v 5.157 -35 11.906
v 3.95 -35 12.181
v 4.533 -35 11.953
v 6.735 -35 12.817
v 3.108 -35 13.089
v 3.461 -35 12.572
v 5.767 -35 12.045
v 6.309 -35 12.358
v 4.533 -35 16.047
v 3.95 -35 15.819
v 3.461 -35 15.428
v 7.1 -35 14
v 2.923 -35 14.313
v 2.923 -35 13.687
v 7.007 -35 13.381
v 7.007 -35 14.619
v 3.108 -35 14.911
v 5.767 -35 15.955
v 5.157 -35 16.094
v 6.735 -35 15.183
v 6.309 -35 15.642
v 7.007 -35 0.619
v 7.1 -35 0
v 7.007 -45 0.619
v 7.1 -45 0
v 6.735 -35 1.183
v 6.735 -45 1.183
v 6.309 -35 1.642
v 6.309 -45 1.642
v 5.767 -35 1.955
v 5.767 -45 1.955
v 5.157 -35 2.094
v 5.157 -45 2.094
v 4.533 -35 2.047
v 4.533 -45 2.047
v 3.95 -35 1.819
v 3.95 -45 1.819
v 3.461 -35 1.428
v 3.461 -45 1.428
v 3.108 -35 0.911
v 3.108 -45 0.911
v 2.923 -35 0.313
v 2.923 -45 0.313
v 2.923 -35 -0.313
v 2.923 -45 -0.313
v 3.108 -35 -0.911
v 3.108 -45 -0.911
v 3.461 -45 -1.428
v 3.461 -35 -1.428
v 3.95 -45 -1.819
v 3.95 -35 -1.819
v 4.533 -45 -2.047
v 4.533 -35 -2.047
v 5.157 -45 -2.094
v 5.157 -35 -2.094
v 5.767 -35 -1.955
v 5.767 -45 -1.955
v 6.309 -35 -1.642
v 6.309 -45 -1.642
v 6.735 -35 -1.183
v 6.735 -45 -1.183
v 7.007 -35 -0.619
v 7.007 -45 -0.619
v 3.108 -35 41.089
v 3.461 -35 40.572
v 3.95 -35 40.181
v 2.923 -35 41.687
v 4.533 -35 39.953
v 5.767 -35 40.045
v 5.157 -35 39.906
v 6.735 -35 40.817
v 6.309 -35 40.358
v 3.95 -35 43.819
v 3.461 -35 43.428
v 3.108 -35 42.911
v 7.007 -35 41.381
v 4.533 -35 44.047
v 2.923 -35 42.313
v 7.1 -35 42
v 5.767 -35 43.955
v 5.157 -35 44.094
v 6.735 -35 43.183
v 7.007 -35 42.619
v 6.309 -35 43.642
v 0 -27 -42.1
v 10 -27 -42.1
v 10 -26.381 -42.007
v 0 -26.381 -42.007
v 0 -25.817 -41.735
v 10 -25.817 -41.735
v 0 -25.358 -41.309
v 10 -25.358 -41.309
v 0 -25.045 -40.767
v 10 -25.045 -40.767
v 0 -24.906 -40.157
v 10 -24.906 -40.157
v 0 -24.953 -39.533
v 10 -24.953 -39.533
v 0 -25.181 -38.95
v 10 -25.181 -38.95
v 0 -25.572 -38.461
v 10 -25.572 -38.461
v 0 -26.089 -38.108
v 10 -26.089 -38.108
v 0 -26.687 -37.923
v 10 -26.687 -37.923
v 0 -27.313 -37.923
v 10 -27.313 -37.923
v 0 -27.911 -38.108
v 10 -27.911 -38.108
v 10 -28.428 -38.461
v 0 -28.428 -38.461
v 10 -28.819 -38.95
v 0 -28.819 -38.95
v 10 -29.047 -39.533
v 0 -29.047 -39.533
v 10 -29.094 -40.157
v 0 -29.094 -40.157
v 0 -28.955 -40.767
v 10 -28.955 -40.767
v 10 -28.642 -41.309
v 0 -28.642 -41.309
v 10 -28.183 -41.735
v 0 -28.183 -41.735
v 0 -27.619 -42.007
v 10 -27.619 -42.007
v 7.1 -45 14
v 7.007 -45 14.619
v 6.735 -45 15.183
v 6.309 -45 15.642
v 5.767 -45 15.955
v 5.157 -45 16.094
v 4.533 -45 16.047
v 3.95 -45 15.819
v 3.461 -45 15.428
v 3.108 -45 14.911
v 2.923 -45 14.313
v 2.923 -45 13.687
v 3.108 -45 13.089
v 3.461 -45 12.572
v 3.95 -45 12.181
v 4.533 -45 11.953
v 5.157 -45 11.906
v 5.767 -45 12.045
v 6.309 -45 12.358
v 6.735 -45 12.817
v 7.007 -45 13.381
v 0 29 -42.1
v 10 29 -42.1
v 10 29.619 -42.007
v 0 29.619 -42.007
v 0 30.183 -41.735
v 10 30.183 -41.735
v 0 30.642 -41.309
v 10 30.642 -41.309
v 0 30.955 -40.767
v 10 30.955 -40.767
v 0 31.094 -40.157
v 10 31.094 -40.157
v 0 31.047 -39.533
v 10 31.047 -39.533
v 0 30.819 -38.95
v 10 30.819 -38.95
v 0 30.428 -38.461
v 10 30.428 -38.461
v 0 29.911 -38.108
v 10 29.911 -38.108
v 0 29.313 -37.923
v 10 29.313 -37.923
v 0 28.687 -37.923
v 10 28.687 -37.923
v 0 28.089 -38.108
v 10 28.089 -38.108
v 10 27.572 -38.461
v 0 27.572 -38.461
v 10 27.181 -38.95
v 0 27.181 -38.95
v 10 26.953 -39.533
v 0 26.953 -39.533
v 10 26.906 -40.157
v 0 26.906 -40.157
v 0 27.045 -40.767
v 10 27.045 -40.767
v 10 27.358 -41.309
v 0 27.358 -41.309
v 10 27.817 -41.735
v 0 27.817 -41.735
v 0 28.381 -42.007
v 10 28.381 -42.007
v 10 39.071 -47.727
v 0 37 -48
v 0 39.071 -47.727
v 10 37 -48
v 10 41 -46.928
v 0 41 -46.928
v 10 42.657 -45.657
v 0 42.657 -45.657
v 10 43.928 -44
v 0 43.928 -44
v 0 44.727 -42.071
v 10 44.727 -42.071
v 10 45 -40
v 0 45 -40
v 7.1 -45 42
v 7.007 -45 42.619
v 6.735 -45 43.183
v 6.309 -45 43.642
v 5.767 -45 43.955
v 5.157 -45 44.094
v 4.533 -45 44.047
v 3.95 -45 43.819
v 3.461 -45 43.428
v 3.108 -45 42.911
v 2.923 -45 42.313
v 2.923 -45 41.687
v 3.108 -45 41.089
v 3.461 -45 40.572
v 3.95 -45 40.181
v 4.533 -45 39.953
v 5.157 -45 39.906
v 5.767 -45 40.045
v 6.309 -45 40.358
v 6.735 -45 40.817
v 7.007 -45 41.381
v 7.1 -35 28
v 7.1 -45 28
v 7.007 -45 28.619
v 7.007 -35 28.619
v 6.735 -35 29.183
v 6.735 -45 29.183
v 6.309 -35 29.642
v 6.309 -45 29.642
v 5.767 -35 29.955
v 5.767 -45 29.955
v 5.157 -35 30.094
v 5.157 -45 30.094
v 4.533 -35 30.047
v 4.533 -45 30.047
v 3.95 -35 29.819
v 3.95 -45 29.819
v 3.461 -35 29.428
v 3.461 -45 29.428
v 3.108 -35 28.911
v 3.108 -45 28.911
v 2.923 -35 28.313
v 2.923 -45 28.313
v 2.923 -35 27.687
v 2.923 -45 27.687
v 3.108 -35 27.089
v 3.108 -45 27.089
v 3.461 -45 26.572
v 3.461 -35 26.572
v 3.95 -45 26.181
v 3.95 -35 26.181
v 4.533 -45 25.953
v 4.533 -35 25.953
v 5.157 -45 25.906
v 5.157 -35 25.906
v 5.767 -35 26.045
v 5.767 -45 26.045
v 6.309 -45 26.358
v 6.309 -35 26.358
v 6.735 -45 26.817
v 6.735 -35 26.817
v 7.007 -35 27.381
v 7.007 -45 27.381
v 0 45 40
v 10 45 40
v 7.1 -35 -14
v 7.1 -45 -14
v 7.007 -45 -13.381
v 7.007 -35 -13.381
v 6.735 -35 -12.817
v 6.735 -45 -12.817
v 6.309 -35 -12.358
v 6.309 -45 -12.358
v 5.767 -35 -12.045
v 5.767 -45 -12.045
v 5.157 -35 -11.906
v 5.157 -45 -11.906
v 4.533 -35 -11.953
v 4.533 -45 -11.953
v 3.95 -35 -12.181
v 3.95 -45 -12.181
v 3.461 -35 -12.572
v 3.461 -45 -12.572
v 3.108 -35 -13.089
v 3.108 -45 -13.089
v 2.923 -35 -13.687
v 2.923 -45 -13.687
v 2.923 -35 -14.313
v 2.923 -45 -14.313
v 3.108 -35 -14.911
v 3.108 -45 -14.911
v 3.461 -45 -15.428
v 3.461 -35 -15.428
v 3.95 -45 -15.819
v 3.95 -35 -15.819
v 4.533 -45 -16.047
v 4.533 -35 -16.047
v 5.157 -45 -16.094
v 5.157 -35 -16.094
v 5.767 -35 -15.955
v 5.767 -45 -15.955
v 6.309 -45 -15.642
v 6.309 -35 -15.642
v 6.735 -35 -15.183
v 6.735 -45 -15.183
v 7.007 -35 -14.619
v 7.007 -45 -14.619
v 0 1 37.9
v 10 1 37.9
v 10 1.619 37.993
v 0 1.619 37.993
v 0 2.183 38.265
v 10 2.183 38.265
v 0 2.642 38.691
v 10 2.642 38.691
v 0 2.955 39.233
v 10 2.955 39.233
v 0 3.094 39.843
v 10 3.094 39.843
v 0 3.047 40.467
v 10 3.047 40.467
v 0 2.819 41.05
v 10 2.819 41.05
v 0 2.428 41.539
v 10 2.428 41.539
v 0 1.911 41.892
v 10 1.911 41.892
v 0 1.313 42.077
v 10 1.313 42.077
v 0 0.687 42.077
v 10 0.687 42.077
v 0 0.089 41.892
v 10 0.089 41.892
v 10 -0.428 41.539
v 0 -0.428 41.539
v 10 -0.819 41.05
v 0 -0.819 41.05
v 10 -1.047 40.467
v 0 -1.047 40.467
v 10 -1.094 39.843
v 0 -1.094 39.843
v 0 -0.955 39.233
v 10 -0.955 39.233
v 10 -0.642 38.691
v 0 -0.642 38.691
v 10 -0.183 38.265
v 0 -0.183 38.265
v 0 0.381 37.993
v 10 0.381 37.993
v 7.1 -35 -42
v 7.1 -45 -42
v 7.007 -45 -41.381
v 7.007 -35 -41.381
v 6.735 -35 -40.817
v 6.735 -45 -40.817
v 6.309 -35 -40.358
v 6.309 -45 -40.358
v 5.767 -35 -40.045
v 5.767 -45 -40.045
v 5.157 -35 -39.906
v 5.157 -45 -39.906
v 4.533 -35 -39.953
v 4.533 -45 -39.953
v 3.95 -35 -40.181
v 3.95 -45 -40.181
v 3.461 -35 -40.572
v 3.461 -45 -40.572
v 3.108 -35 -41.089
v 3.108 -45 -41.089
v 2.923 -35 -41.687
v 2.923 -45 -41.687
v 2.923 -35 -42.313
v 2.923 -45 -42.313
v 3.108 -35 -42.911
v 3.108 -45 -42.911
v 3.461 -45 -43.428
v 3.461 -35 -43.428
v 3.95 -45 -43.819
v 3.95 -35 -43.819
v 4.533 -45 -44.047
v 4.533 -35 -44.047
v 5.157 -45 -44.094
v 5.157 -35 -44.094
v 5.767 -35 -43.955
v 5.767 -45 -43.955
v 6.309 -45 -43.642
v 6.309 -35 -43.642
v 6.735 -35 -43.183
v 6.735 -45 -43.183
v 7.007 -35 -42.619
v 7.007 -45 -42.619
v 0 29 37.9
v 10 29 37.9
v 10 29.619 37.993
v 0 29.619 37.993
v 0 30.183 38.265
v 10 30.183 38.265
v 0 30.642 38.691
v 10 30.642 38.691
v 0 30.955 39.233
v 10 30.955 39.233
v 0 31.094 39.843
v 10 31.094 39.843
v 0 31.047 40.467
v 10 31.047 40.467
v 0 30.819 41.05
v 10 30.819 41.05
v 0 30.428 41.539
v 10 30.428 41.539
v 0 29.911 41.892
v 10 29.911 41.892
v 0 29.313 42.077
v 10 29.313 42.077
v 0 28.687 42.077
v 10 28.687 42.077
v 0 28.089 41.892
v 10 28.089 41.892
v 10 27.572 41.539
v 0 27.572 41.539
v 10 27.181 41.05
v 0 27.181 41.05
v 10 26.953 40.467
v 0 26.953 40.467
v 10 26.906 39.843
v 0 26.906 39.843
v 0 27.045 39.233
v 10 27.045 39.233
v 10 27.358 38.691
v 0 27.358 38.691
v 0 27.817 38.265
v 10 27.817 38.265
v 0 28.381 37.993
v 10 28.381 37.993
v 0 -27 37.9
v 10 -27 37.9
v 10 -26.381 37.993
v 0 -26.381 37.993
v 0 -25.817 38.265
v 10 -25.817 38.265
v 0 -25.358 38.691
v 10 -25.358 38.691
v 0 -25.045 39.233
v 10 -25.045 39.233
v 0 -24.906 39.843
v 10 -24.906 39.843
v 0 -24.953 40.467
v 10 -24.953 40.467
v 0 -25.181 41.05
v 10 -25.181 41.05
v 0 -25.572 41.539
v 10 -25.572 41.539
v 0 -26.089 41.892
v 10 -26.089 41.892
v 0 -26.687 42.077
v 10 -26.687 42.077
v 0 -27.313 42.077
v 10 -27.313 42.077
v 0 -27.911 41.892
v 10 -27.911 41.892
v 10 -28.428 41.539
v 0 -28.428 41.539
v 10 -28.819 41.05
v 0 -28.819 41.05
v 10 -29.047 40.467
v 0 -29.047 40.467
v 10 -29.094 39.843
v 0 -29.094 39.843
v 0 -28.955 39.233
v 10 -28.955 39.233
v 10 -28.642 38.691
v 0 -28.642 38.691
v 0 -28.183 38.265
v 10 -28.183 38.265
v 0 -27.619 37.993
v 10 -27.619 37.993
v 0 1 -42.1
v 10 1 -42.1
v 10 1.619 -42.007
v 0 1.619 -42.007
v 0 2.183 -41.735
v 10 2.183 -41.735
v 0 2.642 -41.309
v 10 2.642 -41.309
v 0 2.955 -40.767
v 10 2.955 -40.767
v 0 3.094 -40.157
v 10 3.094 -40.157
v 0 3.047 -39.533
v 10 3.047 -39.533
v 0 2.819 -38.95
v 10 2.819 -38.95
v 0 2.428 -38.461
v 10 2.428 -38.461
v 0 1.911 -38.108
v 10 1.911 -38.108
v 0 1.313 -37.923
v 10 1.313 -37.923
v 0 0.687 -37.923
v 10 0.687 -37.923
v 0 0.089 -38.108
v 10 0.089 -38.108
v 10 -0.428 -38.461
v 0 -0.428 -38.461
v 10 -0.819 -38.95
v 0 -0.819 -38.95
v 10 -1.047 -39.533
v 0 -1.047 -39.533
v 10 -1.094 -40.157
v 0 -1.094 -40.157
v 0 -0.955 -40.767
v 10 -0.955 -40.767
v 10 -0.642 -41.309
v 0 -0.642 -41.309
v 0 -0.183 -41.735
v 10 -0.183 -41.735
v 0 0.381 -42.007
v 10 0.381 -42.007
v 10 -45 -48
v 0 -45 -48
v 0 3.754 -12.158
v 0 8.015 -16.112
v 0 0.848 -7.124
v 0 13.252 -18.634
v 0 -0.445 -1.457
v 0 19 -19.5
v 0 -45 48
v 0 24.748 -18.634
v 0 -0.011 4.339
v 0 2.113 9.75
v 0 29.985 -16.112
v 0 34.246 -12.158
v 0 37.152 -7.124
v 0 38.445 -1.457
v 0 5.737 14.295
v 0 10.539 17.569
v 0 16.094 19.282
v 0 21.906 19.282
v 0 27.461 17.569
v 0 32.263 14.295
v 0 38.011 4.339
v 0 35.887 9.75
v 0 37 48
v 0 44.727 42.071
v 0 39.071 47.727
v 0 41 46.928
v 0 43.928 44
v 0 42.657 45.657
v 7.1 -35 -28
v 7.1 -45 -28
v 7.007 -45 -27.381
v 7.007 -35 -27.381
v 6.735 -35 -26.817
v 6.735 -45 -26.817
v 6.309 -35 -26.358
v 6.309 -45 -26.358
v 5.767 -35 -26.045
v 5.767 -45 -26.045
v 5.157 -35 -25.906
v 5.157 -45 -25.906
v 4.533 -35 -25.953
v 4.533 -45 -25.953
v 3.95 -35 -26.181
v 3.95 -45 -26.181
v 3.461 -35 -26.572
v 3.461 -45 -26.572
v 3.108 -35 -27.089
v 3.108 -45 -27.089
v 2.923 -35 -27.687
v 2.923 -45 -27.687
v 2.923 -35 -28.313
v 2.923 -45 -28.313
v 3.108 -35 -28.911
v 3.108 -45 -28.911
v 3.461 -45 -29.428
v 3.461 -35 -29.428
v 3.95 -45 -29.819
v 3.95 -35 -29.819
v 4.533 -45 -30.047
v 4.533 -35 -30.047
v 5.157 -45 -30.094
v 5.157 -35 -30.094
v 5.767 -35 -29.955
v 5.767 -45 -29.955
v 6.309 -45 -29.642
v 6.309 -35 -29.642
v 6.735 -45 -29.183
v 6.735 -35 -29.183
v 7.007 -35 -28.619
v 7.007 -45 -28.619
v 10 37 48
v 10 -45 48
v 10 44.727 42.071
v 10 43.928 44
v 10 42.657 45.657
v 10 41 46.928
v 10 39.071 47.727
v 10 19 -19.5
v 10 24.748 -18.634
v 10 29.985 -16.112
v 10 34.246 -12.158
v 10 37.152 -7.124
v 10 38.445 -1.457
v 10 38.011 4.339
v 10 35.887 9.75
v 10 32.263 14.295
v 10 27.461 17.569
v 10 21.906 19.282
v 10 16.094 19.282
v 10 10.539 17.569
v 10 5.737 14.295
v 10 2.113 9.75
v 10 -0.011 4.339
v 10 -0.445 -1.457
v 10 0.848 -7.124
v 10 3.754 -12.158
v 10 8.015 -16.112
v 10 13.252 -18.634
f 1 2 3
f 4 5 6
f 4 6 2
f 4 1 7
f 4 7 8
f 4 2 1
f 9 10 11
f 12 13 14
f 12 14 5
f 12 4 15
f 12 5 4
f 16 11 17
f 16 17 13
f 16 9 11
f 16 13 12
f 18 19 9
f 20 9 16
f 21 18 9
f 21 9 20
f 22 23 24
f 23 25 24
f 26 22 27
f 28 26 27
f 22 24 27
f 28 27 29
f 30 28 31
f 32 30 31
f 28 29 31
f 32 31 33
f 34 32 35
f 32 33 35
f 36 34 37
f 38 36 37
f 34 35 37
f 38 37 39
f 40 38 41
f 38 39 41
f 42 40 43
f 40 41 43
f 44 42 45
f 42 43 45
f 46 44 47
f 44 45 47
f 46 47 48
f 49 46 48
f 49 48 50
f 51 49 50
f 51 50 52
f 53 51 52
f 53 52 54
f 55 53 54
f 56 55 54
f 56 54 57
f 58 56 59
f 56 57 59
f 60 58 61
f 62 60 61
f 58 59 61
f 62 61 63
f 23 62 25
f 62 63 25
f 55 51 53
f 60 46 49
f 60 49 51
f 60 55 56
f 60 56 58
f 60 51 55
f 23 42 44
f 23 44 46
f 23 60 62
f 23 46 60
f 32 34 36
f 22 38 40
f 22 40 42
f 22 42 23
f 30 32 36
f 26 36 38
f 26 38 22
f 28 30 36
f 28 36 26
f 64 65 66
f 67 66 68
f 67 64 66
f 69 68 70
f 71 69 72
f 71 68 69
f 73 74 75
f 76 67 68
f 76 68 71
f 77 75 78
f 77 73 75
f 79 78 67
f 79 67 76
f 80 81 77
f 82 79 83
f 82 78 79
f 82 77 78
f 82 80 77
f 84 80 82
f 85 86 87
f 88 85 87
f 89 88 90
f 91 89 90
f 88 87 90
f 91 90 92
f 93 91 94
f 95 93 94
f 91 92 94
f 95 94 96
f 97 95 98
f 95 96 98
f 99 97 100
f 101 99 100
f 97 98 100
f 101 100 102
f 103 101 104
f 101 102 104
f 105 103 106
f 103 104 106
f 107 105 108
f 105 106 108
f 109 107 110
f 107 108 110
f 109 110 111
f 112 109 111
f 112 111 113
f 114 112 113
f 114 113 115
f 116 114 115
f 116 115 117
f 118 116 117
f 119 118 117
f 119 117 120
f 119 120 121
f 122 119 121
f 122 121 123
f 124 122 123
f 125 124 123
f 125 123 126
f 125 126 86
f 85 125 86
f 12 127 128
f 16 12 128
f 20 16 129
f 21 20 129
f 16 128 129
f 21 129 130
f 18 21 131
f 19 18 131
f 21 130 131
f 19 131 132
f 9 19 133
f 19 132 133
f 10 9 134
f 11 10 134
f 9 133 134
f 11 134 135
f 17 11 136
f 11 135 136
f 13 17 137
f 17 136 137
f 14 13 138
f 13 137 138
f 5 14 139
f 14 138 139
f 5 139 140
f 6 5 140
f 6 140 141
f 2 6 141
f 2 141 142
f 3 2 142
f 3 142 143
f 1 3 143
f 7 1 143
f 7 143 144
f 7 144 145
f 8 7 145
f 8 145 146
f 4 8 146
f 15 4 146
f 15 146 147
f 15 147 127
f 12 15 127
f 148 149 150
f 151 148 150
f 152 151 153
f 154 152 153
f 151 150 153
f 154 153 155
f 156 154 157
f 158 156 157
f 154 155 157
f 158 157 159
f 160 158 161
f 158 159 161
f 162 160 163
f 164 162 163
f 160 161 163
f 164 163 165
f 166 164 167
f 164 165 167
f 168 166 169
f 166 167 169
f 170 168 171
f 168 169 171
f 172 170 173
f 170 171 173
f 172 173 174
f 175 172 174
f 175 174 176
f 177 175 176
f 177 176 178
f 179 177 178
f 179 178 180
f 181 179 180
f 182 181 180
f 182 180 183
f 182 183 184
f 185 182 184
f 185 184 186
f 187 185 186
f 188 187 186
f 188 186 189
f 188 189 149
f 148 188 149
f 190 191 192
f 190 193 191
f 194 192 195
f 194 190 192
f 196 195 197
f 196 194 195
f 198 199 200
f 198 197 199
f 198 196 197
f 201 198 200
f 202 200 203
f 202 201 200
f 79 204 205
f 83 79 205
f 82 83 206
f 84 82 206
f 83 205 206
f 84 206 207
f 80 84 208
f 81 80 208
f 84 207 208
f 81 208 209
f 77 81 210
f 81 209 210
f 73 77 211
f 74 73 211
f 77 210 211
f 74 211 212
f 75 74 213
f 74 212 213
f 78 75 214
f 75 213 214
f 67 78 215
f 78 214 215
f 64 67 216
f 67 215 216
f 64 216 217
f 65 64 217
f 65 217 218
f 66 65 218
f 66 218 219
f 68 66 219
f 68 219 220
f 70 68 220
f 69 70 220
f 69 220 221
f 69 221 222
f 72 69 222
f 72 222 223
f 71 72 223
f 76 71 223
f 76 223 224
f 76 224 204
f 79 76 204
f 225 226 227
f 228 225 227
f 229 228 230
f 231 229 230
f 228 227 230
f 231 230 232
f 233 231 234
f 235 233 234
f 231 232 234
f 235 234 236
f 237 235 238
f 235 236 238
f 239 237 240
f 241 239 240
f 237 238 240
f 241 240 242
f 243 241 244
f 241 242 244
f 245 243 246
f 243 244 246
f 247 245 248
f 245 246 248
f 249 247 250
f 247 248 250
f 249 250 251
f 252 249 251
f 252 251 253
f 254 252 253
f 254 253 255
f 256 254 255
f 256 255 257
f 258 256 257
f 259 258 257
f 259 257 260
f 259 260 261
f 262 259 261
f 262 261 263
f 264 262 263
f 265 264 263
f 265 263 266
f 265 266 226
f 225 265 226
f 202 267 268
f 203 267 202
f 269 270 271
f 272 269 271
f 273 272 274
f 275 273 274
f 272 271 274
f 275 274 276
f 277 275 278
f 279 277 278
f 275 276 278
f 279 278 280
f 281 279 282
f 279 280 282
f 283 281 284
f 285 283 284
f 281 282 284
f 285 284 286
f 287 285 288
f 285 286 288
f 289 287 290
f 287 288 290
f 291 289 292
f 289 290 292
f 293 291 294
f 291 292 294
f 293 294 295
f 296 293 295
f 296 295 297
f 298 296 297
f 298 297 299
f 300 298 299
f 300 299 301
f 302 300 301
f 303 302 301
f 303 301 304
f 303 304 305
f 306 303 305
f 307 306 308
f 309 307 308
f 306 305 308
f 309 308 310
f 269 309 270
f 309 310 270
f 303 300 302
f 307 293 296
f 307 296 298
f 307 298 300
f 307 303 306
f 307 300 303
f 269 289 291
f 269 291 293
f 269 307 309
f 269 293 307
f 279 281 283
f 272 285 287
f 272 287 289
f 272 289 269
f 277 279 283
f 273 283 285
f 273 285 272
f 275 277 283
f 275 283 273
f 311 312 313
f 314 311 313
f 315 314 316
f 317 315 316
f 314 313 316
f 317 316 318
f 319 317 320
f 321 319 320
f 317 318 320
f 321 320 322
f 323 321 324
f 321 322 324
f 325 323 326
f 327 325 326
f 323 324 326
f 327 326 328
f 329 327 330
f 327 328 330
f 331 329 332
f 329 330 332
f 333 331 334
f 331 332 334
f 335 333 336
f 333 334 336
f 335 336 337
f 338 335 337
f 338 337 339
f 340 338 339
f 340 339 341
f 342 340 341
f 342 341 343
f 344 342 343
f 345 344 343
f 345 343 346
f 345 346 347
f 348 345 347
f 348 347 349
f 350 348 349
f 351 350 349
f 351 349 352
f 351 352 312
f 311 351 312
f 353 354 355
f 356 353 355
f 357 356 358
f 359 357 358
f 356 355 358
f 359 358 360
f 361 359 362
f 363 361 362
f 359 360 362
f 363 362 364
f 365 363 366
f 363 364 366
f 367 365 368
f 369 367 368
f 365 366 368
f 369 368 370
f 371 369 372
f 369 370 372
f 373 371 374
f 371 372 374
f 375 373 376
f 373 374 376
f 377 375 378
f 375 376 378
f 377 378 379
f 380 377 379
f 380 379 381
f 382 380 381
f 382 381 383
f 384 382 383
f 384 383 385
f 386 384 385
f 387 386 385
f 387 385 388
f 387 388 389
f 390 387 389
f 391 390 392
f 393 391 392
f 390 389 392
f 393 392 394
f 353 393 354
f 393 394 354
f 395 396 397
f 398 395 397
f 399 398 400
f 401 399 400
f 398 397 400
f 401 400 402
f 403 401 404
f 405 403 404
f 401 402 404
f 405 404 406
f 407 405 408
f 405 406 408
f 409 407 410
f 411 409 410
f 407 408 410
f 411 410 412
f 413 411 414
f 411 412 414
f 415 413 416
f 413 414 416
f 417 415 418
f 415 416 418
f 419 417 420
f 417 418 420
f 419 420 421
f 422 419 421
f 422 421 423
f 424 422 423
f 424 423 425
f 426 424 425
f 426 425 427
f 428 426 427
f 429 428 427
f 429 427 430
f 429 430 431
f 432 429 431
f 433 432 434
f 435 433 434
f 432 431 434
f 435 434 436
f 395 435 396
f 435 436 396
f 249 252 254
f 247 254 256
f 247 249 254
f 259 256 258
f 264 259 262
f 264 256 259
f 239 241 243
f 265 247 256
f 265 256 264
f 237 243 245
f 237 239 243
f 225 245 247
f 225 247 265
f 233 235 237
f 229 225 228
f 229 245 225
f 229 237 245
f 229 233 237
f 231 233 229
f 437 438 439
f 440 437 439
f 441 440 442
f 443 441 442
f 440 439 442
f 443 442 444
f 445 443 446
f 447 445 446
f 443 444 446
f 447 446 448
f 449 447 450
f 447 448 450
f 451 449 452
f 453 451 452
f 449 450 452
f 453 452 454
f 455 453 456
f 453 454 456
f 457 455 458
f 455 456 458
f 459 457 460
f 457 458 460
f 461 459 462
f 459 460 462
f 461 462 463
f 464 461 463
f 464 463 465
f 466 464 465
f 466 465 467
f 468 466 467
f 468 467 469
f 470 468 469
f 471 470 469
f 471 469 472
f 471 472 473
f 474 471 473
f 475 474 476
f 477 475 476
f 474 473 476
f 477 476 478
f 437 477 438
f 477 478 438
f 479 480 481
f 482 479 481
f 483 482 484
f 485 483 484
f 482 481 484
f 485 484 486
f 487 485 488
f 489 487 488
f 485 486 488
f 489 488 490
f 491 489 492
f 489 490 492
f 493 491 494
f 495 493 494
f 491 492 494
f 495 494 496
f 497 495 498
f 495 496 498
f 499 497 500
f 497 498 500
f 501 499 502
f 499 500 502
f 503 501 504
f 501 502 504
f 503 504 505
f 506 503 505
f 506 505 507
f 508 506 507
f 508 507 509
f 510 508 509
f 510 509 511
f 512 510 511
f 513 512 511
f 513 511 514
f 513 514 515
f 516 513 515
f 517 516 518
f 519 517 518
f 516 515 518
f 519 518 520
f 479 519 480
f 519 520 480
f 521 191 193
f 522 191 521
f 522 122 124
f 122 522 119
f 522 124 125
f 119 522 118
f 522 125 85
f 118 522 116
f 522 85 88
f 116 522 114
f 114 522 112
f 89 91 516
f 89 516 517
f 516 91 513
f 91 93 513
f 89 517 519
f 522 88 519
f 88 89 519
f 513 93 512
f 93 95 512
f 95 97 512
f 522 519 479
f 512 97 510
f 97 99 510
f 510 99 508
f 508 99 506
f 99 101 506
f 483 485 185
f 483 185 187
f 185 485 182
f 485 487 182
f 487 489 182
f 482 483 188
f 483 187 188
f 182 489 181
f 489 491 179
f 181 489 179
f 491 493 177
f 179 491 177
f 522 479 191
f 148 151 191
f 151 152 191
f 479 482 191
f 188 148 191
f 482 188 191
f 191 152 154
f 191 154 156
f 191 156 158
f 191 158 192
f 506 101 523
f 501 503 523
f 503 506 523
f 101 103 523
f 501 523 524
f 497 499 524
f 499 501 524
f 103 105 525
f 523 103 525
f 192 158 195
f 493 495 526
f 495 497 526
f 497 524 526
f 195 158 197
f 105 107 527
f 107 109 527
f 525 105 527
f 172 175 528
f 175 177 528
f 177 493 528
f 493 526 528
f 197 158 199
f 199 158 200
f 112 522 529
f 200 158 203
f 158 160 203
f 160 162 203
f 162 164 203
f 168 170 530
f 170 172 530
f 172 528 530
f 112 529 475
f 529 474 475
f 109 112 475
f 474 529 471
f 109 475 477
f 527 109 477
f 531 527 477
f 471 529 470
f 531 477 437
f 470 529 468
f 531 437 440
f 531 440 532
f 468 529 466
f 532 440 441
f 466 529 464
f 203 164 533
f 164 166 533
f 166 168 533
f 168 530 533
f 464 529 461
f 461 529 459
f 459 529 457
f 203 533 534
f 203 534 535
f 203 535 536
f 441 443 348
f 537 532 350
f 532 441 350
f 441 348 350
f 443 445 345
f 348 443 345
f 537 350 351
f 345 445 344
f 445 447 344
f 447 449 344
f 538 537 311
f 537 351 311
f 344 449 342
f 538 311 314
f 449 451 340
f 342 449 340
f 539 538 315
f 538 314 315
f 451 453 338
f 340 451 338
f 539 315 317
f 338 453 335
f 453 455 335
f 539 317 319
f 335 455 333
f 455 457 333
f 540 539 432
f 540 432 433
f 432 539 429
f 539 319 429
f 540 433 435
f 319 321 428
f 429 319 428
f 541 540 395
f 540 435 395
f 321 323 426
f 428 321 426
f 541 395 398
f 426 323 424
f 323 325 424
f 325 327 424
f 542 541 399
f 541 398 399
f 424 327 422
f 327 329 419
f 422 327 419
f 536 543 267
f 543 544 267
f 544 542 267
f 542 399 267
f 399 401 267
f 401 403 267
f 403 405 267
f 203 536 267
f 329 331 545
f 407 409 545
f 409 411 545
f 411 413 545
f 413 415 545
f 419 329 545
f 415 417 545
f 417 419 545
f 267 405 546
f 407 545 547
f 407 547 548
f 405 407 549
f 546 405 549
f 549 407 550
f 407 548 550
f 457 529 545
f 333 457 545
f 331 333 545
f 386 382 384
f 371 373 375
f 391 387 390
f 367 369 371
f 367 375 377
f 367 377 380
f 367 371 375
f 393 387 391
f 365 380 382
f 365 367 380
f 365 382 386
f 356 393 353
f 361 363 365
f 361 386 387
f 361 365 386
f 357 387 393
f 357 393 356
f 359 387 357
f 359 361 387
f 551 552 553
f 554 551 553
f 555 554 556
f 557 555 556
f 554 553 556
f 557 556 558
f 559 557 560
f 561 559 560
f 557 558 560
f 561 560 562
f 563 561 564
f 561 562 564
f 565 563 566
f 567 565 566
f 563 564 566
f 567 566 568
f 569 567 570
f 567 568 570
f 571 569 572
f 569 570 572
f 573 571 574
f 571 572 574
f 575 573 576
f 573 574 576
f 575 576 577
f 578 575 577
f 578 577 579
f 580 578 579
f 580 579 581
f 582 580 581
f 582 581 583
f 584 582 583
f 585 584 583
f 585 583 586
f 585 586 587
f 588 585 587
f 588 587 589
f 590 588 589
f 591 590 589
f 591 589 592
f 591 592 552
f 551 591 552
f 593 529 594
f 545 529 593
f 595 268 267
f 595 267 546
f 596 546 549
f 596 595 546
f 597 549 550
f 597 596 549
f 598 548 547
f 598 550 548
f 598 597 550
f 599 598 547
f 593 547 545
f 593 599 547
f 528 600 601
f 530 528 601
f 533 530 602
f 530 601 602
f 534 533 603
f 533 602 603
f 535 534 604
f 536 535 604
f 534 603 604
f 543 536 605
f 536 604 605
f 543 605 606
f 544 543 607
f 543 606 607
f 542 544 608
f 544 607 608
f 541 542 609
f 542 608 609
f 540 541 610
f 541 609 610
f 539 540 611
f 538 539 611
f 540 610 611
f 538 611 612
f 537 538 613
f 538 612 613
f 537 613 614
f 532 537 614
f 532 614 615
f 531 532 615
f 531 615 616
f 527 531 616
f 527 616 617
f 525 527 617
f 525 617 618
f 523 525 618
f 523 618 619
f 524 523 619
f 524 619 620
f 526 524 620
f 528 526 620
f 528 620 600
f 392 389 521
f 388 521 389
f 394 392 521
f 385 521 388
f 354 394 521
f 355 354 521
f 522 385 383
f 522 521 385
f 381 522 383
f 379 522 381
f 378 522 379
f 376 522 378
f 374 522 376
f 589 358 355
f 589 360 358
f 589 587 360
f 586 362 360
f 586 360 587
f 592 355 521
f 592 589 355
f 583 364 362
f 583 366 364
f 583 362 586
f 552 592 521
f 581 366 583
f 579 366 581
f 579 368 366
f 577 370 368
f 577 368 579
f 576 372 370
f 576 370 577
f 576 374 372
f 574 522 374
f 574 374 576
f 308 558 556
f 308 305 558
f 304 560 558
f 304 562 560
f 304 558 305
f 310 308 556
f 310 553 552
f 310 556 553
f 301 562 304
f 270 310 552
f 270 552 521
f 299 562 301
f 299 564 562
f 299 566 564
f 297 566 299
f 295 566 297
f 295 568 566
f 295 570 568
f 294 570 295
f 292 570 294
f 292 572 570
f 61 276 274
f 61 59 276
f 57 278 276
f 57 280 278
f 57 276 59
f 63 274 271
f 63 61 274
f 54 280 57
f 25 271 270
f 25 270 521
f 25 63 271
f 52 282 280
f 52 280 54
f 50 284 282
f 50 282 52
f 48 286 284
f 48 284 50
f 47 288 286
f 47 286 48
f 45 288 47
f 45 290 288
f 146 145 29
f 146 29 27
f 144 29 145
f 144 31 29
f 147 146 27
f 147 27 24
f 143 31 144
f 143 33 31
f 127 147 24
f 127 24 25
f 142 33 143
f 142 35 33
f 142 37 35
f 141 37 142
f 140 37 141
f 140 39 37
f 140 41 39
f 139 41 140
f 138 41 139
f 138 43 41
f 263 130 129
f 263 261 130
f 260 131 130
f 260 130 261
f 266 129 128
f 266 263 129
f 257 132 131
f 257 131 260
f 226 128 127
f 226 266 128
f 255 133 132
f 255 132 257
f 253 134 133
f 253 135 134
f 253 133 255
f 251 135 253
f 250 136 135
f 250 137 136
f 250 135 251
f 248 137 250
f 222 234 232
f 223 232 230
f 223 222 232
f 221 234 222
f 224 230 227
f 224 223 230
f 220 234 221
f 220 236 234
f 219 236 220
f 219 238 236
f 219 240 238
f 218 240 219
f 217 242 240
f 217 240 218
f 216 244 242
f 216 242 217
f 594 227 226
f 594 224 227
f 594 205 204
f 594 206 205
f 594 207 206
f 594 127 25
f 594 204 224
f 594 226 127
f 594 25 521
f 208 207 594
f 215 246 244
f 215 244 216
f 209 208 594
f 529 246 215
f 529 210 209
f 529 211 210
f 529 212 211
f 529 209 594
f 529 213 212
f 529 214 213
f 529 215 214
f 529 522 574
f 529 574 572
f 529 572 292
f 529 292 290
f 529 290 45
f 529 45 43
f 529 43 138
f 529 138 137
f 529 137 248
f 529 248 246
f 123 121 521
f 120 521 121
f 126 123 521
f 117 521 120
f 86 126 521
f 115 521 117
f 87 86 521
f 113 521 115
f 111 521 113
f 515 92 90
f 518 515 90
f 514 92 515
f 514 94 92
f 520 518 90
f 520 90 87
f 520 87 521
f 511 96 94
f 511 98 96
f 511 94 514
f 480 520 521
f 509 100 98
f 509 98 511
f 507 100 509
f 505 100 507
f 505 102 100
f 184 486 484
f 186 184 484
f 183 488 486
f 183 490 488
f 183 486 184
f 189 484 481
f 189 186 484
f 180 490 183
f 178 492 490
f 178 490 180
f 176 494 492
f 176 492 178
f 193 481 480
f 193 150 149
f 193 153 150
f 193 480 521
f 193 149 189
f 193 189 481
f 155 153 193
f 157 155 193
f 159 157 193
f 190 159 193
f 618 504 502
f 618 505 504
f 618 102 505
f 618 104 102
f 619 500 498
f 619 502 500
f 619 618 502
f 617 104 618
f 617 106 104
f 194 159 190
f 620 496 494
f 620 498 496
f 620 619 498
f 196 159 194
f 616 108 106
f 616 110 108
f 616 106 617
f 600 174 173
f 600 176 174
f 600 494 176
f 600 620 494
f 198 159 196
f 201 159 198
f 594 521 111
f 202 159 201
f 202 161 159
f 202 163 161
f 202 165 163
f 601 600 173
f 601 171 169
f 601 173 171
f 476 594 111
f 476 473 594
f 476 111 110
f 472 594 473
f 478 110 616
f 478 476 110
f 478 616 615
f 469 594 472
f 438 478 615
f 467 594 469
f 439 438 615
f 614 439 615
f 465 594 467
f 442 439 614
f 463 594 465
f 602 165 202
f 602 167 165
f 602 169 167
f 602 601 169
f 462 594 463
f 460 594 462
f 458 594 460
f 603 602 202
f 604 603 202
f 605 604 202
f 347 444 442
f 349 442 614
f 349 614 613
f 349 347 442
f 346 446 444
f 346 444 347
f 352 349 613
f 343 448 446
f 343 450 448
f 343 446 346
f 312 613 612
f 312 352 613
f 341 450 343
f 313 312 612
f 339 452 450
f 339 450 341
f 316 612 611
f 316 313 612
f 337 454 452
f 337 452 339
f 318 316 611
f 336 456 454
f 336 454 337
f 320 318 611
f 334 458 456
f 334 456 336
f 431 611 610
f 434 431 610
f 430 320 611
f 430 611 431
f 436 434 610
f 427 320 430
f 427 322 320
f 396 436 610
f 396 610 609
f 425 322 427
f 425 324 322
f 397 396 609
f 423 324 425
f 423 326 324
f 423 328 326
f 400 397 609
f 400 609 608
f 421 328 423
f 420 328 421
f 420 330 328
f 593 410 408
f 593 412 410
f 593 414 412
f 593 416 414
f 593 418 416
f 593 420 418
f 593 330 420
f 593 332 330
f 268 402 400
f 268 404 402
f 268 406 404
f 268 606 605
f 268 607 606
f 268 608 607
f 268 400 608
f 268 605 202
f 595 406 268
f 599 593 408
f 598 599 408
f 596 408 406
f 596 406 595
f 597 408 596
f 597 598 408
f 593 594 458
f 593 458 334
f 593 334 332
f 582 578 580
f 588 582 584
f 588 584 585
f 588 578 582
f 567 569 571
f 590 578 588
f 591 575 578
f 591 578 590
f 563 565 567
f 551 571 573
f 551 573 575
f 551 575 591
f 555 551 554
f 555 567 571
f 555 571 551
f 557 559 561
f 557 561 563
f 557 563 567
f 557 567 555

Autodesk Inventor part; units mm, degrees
ref_plane "YZ Plane" through (0, 0, 0) normal (1, 0, 0) x (0, 1, 0)
ref_plane "XZ Plane" through (0, 0, 0) normal (0, 1, 0) x (-1, 0, 0)
ref_plane "XY Plane" through (0, 0, 0) normal (0, 0, 1) x (1, 0, 0)
sketch "Sketch1" plane through (0, 0, 0) normal (1, 0, 0) x (0, 1, 0)
  line L0 (-45, 48) -> (45, 48)
  line L1 (45, 48) -> (45, -48)
  line L2 (45, -48) -> (-45, -48)
  line L3 (-45, -48) -> (-45, 48)
  line L4 (-45, 48) -> (45, -48) construction
  line L5 (45, 48) -> (-45, -48) construction
  point P0 (0, 0)
  dimension "d0" = 90
  dimension "d1" = 96
extrude "Extrusion1" add sketch "Sketch1" along normal blind 10
sketch "Sketch3" plane through (10, 0, 0) normal (1, 0, 0) x (0, 0, -1)
  circle A0 centre (0, 19) radius 19.5
  line L0 (-48, -45) -> (48, -45) projected
  point P0 (0, 0)
  point P1 (0, -45)
  dimension "d16" = 39
  dimension "d17" = 64
extrude "Extrusion3" cut sketch "Sketch3" against normal through all
sketch "Sketch5" plane through (10, 0, 0) normal (1, 0, 0) x (0, 0, -1)
  circle A0 centre (-40, 29) radius 2.1
  line L0 (-48, 45) -> (-48, -45) construction
  line L1 (-48, -45) -> (48, -45) projected
  circle A1 centre (-40, 1) radius 2.1
  circle A2 centre (-40, -27) radius 2.1
  circle A3 centre (0, 19) radius 19.5 construction
  line L2 (0, 38.5) -> (0, 19) construction
  circle A4 centre (40, 29) radius 2.1
  circle A5 centre (40, 1) radius 2.1
  circle A6 centre (40, -27) radius 2.1
  point P0 (0, 0)
  point P1 (-7.5, 41)
  point P2 (7.5, 41)
  dimension "d32" = 4.2
  dimension "d33" = 8
  dimension "d34" = 74
  dimension "d37" = 28
extrude "Extrusion5" cut sketch "Sketch5" against normal through all
sketch "Sketch6" plane through (0, -45, -48) normal (0, -1, 0) x (1, 0, 0)
  circle A0 centre (5, 90) radius 2.1
  line L0 (0, 96) -> (0, 0) construction
  line L1 (0, 96) -> (10, 96) construction
  circle A1 centre (5, 76) radius 2.1
  circle A2 centre (5, 62) radius 2.1
  circle A3 centre (5, 48) radius 2.1
  circle A4 centre (5, 34) radius 2.1
  circle A5 centre (5, 20) radius 2.1
  circle A6 centre (5, 6) radius 2.1
  point P0 (0, 48)
  point P1 (0, 48)
  point P2 (5, 96)
  dimension "d44" = 4.2
  dimension "d45" = 42
  dimension "d48" = 14
extrude "Extrusion6" cut sketch "Sketch6" against normal blind 10
thread "Thread1" size "M4.5x0.75" class "6H" standard "ISO Metric profile" full length
thread "Thread2" size "M4.5x0.75" class "6H" standard "ANSI Metric M Profile" full length
thread "Thread3" size "M4.5x0.75" class "6H" standard "ANSI Metric M Profile" full length
thread "Thread4" size "M4.5x0.75" class "6H" standard "ANSI Metric M Profile" full length
thread "Thread5" size "M4.5x0.75" class "6H" standard "ANSI Metric M Profile" full length
thread "Thread6" size "M4.5x0.75" class "6H" standard "ANSI Metric M Profile" full length
thread "Thread7" size "M4.5x0.75" class "6H" standard "ANSI Metric M Profile" full length
fillet "Fillet1" radius 8 2 edges at (5, 45, 48) (5, 45, -48)
properties part number "ArmSupportPlate" material "Aluminum 6061"
